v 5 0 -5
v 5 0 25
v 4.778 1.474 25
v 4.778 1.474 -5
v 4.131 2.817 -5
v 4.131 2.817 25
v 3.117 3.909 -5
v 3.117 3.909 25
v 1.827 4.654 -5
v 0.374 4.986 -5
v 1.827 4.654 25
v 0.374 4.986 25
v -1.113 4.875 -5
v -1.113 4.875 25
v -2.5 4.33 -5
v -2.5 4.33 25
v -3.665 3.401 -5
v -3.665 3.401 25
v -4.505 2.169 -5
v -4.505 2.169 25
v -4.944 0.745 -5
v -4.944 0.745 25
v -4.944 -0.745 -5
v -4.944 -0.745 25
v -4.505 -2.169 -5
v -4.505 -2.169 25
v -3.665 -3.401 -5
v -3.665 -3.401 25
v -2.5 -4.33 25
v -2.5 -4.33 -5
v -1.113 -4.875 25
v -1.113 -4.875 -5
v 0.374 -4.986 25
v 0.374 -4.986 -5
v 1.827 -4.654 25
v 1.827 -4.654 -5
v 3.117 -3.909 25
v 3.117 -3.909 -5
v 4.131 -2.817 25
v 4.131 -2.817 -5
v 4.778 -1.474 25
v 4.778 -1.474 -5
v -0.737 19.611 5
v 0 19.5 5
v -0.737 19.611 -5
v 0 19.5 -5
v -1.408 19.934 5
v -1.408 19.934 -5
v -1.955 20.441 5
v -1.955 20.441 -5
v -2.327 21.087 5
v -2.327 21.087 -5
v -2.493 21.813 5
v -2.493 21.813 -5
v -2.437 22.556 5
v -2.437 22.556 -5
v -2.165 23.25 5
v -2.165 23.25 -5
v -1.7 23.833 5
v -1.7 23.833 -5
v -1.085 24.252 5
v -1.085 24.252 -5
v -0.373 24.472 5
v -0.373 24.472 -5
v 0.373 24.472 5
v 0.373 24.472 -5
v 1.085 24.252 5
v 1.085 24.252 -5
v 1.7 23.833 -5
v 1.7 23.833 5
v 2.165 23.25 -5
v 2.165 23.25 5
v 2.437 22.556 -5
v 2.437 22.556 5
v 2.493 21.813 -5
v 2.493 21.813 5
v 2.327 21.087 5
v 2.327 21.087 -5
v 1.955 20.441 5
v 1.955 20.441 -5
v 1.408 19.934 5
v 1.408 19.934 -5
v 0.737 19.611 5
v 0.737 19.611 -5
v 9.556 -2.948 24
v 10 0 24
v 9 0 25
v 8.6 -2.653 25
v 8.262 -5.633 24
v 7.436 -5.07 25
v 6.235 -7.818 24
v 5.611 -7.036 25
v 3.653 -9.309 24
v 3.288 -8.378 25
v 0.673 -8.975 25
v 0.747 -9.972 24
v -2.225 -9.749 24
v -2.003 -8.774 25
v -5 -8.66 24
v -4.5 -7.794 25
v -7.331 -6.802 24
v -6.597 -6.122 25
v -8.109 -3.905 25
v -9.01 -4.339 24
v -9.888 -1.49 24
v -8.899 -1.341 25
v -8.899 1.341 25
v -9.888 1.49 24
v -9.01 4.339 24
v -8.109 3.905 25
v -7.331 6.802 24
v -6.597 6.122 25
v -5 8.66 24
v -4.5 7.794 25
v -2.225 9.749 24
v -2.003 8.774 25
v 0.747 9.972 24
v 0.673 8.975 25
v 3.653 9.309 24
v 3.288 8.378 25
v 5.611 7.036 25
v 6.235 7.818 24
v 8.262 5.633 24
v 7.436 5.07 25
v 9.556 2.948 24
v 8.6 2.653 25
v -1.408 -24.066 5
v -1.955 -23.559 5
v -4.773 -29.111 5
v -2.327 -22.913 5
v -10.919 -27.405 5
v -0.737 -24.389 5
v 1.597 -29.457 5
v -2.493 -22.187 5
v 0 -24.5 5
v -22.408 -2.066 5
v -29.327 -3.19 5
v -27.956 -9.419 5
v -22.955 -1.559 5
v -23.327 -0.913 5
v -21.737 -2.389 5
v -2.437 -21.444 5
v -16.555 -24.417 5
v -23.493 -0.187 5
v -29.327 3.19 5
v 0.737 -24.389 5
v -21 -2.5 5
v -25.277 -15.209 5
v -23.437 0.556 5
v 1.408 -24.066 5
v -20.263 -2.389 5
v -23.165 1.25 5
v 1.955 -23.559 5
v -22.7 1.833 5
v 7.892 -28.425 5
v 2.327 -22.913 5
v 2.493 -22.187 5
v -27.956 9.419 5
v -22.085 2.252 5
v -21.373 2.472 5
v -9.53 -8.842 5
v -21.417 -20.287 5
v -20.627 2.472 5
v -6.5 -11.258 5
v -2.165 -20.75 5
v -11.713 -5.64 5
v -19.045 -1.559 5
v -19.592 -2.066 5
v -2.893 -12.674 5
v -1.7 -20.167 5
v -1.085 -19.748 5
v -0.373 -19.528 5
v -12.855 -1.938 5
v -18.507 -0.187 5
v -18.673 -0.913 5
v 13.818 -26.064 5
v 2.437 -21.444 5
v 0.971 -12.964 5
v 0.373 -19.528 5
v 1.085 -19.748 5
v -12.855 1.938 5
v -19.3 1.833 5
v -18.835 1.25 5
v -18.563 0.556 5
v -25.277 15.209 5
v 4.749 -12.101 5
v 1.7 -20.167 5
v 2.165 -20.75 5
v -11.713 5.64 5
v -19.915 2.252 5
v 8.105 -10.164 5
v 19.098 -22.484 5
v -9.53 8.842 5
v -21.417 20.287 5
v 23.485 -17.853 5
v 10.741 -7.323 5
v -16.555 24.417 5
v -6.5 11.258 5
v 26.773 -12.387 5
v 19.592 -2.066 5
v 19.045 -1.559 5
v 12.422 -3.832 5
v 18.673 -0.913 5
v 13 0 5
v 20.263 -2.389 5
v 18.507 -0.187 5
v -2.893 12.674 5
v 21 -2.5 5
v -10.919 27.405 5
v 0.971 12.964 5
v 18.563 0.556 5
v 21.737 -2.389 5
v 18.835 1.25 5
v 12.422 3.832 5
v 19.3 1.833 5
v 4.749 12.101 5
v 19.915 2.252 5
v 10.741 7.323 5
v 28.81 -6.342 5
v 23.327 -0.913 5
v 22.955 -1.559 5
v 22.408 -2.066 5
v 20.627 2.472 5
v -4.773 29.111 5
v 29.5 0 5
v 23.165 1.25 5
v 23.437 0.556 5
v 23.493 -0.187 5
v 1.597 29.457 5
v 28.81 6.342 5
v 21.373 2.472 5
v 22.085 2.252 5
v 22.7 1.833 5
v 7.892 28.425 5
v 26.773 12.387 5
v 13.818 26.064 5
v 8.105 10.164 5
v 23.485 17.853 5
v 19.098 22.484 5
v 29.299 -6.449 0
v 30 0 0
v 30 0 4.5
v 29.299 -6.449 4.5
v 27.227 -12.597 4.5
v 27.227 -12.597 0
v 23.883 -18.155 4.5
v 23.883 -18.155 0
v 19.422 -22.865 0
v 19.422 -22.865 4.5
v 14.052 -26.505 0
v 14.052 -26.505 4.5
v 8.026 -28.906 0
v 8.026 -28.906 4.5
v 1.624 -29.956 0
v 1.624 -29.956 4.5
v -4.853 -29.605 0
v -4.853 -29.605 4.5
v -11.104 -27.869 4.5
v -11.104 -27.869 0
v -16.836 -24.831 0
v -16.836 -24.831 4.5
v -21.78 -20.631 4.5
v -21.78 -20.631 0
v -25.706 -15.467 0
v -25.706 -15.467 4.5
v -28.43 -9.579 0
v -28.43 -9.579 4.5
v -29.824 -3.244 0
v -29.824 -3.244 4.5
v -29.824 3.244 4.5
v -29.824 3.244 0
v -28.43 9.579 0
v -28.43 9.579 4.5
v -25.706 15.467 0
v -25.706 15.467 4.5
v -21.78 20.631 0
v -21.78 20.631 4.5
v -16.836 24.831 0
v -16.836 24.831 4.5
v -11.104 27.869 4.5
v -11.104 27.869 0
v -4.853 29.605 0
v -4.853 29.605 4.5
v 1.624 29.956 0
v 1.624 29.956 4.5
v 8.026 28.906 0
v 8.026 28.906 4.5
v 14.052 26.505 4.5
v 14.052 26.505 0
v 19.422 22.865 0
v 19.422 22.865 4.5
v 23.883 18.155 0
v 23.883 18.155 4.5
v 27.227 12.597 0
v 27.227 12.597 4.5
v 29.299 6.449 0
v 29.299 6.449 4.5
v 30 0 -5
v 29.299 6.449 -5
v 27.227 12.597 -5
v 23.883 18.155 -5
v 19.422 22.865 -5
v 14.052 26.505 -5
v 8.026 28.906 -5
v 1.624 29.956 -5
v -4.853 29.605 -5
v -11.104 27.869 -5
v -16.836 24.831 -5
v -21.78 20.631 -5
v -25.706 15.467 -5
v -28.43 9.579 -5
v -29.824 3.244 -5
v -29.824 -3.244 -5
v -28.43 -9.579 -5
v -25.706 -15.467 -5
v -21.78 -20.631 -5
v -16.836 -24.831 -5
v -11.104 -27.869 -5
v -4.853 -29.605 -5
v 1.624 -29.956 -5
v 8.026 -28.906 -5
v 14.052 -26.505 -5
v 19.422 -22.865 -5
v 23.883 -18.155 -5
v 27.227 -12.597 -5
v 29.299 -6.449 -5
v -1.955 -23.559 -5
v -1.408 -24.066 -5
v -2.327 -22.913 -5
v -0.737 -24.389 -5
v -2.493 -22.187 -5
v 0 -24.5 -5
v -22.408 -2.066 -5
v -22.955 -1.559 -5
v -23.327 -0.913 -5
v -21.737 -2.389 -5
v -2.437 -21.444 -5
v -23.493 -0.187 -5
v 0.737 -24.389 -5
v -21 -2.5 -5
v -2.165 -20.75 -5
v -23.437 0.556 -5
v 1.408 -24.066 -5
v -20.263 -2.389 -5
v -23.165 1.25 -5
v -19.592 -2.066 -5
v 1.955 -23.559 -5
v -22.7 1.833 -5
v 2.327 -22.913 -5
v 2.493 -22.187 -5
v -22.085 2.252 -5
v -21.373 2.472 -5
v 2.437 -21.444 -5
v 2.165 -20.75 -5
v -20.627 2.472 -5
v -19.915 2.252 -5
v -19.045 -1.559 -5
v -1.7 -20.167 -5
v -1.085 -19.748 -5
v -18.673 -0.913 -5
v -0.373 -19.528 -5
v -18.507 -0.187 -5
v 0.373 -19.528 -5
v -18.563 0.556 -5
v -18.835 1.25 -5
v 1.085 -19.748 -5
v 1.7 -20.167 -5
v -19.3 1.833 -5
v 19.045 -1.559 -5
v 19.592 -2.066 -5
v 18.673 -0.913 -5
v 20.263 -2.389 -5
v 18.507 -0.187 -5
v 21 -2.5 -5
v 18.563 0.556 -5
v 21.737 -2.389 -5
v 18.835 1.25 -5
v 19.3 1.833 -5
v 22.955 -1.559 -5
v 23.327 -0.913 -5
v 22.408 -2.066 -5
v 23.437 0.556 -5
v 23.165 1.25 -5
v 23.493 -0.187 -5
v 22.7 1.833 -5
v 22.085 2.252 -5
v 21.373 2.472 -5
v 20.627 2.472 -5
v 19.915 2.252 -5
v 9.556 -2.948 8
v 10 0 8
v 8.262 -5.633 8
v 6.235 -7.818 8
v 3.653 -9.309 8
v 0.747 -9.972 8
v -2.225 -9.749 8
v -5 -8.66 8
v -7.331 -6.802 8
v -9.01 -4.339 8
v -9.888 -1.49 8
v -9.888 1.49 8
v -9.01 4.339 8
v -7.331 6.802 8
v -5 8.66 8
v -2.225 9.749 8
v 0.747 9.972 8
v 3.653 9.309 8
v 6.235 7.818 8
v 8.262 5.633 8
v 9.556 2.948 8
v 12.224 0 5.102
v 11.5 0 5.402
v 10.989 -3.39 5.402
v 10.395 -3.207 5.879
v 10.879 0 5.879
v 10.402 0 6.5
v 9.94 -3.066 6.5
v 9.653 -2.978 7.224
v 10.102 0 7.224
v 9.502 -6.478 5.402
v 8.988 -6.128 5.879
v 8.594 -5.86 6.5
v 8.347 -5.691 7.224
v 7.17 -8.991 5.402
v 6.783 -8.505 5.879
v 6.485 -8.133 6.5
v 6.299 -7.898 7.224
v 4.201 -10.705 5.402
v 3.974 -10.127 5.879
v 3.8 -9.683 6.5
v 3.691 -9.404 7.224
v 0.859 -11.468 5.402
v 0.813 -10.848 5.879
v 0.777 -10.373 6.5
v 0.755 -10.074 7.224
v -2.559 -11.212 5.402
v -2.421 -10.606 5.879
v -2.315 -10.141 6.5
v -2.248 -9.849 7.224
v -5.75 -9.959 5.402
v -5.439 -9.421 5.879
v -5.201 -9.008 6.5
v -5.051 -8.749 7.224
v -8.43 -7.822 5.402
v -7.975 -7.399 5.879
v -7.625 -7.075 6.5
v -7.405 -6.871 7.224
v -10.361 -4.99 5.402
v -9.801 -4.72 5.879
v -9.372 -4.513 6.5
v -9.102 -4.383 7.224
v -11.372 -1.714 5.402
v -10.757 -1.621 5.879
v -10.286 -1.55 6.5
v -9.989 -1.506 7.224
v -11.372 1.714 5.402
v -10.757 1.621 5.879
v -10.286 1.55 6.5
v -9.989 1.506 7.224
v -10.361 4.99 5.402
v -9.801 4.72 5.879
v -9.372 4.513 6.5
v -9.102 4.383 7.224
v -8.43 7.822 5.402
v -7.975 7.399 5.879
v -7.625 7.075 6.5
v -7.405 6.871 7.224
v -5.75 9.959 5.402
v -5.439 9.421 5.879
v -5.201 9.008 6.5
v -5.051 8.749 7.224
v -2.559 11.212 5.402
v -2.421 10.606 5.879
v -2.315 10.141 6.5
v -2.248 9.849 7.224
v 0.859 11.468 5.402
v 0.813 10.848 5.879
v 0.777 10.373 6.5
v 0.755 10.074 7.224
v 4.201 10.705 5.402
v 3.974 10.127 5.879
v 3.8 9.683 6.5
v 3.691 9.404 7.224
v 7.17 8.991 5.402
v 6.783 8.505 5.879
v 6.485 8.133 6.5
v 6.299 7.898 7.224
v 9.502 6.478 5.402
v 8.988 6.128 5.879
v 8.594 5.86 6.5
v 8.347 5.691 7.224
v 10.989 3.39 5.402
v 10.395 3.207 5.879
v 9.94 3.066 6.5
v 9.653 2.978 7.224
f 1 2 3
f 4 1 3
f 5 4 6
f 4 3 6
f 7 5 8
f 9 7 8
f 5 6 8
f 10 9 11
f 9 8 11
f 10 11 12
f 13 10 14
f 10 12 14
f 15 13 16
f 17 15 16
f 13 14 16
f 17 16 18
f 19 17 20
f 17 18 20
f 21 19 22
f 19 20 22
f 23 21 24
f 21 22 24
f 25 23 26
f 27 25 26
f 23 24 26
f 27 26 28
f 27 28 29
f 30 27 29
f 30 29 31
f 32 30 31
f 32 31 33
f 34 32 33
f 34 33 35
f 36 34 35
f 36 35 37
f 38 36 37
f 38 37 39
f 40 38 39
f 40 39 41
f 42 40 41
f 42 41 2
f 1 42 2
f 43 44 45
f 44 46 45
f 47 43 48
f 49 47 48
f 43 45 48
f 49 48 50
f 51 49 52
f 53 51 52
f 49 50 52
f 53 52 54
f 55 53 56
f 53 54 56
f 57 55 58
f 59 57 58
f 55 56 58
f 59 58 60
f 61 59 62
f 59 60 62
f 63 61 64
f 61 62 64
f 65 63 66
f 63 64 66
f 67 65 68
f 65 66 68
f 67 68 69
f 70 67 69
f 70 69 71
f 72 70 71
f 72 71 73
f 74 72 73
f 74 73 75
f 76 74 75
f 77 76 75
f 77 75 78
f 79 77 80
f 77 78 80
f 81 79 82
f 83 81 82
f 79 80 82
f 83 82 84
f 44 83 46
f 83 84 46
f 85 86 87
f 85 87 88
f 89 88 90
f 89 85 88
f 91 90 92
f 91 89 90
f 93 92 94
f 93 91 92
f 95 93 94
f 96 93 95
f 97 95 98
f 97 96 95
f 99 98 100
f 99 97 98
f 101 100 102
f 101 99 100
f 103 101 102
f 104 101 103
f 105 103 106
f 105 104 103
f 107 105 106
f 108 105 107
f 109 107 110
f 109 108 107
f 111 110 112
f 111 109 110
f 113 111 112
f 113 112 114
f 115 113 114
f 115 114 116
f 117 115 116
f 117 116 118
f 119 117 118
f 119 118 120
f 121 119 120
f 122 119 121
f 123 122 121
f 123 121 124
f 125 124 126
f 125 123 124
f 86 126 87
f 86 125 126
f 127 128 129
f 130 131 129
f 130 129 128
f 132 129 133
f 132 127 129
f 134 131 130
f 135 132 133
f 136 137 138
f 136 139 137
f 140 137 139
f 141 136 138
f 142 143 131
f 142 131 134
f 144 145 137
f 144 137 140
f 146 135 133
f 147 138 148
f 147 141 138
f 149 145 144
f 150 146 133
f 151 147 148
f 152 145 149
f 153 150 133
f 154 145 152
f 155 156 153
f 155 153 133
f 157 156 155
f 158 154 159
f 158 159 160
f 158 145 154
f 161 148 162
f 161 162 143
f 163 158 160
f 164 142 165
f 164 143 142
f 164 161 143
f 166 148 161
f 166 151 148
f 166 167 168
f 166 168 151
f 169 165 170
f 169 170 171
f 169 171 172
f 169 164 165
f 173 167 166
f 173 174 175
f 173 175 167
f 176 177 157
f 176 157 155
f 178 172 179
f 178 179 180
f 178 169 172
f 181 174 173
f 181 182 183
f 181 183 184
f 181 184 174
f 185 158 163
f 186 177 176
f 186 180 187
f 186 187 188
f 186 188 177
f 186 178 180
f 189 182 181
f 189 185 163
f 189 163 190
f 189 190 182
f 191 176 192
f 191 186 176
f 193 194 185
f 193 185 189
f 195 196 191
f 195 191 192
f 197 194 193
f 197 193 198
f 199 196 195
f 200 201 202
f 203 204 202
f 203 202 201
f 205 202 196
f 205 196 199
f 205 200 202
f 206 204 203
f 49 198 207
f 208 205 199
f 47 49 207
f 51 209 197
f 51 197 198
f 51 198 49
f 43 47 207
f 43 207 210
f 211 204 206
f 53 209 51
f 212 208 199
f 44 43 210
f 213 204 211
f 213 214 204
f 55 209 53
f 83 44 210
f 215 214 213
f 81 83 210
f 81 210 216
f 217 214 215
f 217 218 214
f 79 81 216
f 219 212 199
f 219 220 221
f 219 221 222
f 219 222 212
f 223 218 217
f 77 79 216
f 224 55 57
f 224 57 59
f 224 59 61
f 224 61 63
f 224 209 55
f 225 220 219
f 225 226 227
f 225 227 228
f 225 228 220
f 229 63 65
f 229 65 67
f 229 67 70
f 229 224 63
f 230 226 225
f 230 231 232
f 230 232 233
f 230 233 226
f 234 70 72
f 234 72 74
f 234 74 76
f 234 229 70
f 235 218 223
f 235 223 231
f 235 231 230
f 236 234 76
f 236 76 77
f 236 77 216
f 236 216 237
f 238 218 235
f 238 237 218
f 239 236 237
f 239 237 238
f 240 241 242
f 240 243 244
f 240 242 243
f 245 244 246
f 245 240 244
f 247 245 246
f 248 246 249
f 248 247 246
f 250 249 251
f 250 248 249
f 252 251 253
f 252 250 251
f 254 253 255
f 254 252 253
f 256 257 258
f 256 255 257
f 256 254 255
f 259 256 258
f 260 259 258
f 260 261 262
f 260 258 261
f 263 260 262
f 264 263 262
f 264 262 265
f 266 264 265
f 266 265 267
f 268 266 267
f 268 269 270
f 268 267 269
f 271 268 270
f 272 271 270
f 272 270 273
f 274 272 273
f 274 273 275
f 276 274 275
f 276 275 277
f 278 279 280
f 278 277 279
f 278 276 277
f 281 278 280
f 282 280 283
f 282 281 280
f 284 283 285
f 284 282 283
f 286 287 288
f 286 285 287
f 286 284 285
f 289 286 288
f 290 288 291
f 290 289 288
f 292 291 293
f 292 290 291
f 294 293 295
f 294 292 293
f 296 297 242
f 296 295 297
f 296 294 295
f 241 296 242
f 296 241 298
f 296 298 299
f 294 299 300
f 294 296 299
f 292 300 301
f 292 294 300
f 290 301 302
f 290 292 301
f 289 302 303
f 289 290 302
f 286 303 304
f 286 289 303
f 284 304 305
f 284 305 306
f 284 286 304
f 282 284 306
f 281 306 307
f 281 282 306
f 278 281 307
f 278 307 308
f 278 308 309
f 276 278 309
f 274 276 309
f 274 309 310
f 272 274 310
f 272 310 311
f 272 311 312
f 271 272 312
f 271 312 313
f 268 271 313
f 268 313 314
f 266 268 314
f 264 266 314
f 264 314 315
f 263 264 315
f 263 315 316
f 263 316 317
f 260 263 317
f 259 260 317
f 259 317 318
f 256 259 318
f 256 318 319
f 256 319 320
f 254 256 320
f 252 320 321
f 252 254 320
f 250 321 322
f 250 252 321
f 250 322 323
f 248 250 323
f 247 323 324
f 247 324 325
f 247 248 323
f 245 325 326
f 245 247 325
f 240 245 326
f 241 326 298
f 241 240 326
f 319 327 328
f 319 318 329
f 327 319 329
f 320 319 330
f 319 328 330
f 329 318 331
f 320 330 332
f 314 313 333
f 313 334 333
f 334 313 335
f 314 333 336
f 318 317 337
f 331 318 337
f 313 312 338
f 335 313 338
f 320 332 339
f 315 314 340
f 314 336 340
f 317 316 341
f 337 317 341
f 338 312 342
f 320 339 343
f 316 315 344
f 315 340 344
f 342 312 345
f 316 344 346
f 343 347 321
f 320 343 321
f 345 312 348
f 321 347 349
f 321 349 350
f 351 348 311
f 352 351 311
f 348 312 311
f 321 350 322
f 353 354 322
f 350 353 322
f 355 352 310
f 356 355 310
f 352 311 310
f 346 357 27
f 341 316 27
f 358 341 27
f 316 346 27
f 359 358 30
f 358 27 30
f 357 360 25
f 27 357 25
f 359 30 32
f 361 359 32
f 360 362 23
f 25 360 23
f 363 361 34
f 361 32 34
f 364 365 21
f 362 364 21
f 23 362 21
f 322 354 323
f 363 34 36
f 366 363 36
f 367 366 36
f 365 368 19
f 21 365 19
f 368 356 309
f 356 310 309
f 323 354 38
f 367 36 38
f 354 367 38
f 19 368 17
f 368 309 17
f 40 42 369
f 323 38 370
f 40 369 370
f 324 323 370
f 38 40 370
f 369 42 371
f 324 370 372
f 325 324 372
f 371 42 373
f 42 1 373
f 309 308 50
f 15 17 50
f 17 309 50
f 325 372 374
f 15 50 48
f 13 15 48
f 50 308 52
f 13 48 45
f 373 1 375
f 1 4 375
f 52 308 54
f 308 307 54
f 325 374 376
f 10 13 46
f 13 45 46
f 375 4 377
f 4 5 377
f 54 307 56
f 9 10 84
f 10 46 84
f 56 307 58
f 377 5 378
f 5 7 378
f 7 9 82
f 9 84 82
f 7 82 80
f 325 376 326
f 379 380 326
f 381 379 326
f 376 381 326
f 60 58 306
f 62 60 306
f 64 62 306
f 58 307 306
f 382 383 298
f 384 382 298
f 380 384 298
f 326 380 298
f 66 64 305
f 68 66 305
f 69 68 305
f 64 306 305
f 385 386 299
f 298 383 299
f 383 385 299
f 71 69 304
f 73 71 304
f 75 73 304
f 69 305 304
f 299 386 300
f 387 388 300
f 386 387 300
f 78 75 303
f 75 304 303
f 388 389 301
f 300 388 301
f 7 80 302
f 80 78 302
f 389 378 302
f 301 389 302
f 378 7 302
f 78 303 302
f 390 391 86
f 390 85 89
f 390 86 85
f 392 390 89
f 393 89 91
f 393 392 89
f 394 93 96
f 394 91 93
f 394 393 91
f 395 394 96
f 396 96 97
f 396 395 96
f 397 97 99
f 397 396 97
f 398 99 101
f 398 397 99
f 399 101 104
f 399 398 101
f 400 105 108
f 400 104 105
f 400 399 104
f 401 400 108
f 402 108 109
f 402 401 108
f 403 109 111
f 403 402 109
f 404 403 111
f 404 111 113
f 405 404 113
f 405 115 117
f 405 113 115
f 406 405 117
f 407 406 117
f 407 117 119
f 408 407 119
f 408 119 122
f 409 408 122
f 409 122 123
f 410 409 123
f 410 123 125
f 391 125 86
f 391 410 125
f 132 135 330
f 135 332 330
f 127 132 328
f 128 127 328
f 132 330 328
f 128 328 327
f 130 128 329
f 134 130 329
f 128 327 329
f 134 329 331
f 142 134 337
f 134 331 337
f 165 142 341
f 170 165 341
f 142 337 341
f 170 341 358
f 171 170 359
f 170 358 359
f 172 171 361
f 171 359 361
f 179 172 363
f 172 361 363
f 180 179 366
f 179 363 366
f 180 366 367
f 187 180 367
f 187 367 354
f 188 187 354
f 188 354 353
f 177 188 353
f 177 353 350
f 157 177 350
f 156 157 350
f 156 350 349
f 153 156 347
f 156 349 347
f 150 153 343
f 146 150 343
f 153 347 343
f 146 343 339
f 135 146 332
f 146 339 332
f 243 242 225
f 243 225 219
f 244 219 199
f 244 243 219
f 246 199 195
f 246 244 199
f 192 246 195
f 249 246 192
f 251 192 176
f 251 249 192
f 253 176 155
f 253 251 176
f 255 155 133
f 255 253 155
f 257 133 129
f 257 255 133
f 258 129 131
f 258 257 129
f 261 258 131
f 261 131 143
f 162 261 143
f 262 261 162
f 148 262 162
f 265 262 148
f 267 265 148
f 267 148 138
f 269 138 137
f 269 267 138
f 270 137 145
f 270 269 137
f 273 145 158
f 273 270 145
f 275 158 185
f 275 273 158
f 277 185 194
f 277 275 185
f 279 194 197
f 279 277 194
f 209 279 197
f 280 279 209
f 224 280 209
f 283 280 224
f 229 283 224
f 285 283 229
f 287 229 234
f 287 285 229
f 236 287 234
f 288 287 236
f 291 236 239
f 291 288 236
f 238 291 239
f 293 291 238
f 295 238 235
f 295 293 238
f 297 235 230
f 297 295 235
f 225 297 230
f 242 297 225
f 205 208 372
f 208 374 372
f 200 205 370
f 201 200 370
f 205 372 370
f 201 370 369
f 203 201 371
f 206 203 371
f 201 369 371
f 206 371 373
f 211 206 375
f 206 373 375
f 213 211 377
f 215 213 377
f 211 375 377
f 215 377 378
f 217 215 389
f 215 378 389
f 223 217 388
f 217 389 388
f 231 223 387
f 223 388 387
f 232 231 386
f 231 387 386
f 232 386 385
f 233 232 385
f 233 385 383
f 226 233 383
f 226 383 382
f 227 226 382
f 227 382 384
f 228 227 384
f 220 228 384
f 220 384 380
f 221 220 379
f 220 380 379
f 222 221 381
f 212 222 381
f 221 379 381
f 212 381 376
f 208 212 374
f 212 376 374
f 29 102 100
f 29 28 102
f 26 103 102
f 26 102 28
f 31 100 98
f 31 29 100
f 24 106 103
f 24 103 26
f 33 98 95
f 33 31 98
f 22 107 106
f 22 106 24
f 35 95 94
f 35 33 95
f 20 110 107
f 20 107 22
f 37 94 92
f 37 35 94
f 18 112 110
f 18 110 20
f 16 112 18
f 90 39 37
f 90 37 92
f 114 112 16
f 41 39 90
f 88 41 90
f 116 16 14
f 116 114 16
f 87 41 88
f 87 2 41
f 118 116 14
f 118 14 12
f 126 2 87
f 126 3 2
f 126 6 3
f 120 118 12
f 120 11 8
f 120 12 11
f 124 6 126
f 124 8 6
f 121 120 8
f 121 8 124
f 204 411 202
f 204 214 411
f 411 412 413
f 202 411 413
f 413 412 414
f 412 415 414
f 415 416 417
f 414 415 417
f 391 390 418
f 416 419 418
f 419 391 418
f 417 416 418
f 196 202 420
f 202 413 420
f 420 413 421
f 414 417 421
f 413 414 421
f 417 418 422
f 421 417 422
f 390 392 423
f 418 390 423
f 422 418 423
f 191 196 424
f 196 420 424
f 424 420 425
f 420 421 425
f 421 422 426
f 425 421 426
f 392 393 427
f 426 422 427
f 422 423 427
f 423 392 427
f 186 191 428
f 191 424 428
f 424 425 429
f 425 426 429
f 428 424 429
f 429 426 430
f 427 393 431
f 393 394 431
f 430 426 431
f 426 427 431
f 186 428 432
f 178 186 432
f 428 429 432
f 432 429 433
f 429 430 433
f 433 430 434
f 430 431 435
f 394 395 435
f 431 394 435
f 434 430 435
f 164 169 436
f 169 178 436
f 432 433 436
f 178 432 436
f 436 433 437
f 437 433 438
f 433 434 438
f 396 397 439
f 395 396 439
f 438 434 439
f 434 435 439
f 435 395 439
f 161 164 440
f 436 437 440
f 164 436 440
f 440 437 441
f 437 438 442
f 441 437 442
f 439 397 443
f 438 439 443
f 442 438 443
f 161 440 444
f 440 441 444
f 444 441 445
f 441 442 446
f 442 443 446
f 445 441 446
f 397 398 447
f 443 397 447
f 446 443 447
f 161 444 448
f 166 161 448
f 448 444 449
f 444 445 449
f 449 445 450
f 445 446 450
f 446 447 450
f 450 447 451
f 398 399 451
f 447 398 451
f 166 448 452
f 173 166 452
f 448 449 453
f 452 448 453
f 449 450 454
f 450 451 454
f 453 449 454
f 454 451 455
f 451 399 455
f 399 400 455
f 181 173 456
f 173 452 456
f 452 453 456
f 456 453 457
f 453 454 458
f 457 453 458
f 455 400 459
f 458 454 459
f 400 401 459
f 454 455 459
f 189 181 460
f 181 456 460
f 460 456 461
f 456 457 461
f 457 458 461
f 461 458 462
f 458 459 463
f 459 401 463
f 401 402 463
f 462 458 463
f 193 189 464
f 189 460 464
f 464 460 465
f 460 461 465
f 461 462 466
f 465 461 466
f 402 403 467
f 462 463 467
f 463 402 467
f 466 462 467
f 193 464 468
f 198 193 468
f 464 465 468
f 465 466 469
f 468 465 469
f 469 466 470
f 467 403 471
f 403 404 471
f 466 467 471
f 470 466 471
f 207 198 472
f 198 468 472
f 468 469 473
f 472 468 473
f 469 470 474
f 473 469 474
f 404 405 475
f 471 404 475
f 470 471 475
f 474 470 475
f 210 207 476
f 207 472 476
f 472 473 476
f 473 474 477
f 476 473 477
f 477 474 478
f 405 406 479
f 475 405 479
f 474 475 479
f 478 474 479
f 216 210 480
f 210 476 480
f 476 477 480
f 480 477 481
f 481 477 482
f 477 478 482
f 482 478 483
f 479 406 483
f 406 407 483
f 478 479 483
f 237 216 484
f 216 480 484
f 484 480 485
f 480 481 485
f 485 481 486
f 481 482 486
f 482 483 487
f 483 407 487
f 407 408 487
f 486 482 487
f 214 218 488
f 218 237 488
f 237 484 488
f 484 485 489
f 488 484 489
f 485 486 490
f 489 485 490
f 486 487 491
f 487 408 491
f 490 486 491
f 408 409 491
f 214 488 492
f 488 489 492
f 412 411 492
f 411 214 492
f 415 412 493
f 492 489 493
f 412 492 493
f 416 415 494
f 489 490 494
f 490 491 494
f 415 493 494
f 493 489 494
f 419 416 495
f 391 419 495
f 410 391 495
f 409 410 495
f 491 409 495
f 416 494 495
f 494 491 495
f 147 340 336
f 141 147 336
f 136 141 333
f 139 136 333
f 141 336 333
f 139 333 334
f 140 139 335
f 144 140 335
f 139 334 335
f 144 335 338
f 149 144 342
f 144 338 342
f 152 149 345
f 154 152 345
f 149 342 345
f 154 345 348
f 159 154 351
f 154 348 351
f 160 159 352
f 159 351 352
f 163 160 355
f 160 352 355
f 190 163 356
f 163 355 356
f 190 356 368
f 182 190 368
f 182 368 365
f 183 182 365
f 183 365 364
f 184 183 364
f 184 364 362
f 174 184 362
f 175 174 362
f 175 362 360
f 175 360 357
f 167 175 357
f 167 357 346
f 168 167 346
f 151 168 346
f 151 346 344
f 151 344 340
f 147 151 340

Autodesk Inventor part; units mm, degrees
ref_plane "YZ Plane" through (0, 0, 0) normal (1, 0, 0) x (0, 1, 0)
ref_plane "XZ Plane" through (0, 0, 0) normal (0, 1, 0) x (-1, 0, 0)
ref_plane "XY Plane" through (0, 0, 0) normal (0, 0, 1) x (1, 0, 0)
sketch "Sketch1" plane through (0, 0, 0) normal (0, 0, 1) x (1, 0, 0)
  circle A0 centre (0, 0) radius 30
  dimension "d0" = 60
extrude "Extrusion1" add sketch "Sketch1" along normal mid plane 10
sketch "Sketch2" plane through (0, 0, 5) normal (0, 0, 1) x (1, 0, 0)
  circle A0 centre (0, 0) radius 30 projected
  circle A1 centre (0, 0) radius 10
  dimension "d3" = 20
extrude "Extrusion2" add sketch "Sketch2" along normal blind 20 contours A1
sketch "Sketch3" plane through (0, 0, 25) normal (0, 0, 1) x (1, 0, 0)
  circle A0 centre (0, 0) radius 10 projected
  circle A1 centre (0, 0) radius 5
  dimension "d6" = 10
extrude "Extrusion3" cut sketch "Sketch3" against normal through all contours A1
fillet "Fillet1" radius 3 1 edges at (-10, 0, 5)
chamfer "Chamfer1" distance 1 angle 45 1 edges at (-10, 0, 25)
sketch "Sketch5" plane through (0, 0, 5) normal (0, 0, 1) x (1, 0, 0)
  circle A0 centre (0, 0) radius 30 projected
  circle A1 centre (0, 0) radius 5 projected
  point P0 (-21, 0)
  point P1 (21, 0)
  point P2 (0, 22)
  point P3 (0, -22)
  dimension "d14" = 21
  dimension "d15" = 22
  dimension "d16" = 21
  dimension "d17" = 22
hole "Hole1" at (-21, 0, 5) at (21, 0, 5) at (0, 22, 5) at (0, -22, 5) direction (0, 0, -1) diameter 5 end through all
chamfer "Chamfer2" distance 0.5 angle 45 1 edges at (-30, 0, 5)
properties part number "Flange"
